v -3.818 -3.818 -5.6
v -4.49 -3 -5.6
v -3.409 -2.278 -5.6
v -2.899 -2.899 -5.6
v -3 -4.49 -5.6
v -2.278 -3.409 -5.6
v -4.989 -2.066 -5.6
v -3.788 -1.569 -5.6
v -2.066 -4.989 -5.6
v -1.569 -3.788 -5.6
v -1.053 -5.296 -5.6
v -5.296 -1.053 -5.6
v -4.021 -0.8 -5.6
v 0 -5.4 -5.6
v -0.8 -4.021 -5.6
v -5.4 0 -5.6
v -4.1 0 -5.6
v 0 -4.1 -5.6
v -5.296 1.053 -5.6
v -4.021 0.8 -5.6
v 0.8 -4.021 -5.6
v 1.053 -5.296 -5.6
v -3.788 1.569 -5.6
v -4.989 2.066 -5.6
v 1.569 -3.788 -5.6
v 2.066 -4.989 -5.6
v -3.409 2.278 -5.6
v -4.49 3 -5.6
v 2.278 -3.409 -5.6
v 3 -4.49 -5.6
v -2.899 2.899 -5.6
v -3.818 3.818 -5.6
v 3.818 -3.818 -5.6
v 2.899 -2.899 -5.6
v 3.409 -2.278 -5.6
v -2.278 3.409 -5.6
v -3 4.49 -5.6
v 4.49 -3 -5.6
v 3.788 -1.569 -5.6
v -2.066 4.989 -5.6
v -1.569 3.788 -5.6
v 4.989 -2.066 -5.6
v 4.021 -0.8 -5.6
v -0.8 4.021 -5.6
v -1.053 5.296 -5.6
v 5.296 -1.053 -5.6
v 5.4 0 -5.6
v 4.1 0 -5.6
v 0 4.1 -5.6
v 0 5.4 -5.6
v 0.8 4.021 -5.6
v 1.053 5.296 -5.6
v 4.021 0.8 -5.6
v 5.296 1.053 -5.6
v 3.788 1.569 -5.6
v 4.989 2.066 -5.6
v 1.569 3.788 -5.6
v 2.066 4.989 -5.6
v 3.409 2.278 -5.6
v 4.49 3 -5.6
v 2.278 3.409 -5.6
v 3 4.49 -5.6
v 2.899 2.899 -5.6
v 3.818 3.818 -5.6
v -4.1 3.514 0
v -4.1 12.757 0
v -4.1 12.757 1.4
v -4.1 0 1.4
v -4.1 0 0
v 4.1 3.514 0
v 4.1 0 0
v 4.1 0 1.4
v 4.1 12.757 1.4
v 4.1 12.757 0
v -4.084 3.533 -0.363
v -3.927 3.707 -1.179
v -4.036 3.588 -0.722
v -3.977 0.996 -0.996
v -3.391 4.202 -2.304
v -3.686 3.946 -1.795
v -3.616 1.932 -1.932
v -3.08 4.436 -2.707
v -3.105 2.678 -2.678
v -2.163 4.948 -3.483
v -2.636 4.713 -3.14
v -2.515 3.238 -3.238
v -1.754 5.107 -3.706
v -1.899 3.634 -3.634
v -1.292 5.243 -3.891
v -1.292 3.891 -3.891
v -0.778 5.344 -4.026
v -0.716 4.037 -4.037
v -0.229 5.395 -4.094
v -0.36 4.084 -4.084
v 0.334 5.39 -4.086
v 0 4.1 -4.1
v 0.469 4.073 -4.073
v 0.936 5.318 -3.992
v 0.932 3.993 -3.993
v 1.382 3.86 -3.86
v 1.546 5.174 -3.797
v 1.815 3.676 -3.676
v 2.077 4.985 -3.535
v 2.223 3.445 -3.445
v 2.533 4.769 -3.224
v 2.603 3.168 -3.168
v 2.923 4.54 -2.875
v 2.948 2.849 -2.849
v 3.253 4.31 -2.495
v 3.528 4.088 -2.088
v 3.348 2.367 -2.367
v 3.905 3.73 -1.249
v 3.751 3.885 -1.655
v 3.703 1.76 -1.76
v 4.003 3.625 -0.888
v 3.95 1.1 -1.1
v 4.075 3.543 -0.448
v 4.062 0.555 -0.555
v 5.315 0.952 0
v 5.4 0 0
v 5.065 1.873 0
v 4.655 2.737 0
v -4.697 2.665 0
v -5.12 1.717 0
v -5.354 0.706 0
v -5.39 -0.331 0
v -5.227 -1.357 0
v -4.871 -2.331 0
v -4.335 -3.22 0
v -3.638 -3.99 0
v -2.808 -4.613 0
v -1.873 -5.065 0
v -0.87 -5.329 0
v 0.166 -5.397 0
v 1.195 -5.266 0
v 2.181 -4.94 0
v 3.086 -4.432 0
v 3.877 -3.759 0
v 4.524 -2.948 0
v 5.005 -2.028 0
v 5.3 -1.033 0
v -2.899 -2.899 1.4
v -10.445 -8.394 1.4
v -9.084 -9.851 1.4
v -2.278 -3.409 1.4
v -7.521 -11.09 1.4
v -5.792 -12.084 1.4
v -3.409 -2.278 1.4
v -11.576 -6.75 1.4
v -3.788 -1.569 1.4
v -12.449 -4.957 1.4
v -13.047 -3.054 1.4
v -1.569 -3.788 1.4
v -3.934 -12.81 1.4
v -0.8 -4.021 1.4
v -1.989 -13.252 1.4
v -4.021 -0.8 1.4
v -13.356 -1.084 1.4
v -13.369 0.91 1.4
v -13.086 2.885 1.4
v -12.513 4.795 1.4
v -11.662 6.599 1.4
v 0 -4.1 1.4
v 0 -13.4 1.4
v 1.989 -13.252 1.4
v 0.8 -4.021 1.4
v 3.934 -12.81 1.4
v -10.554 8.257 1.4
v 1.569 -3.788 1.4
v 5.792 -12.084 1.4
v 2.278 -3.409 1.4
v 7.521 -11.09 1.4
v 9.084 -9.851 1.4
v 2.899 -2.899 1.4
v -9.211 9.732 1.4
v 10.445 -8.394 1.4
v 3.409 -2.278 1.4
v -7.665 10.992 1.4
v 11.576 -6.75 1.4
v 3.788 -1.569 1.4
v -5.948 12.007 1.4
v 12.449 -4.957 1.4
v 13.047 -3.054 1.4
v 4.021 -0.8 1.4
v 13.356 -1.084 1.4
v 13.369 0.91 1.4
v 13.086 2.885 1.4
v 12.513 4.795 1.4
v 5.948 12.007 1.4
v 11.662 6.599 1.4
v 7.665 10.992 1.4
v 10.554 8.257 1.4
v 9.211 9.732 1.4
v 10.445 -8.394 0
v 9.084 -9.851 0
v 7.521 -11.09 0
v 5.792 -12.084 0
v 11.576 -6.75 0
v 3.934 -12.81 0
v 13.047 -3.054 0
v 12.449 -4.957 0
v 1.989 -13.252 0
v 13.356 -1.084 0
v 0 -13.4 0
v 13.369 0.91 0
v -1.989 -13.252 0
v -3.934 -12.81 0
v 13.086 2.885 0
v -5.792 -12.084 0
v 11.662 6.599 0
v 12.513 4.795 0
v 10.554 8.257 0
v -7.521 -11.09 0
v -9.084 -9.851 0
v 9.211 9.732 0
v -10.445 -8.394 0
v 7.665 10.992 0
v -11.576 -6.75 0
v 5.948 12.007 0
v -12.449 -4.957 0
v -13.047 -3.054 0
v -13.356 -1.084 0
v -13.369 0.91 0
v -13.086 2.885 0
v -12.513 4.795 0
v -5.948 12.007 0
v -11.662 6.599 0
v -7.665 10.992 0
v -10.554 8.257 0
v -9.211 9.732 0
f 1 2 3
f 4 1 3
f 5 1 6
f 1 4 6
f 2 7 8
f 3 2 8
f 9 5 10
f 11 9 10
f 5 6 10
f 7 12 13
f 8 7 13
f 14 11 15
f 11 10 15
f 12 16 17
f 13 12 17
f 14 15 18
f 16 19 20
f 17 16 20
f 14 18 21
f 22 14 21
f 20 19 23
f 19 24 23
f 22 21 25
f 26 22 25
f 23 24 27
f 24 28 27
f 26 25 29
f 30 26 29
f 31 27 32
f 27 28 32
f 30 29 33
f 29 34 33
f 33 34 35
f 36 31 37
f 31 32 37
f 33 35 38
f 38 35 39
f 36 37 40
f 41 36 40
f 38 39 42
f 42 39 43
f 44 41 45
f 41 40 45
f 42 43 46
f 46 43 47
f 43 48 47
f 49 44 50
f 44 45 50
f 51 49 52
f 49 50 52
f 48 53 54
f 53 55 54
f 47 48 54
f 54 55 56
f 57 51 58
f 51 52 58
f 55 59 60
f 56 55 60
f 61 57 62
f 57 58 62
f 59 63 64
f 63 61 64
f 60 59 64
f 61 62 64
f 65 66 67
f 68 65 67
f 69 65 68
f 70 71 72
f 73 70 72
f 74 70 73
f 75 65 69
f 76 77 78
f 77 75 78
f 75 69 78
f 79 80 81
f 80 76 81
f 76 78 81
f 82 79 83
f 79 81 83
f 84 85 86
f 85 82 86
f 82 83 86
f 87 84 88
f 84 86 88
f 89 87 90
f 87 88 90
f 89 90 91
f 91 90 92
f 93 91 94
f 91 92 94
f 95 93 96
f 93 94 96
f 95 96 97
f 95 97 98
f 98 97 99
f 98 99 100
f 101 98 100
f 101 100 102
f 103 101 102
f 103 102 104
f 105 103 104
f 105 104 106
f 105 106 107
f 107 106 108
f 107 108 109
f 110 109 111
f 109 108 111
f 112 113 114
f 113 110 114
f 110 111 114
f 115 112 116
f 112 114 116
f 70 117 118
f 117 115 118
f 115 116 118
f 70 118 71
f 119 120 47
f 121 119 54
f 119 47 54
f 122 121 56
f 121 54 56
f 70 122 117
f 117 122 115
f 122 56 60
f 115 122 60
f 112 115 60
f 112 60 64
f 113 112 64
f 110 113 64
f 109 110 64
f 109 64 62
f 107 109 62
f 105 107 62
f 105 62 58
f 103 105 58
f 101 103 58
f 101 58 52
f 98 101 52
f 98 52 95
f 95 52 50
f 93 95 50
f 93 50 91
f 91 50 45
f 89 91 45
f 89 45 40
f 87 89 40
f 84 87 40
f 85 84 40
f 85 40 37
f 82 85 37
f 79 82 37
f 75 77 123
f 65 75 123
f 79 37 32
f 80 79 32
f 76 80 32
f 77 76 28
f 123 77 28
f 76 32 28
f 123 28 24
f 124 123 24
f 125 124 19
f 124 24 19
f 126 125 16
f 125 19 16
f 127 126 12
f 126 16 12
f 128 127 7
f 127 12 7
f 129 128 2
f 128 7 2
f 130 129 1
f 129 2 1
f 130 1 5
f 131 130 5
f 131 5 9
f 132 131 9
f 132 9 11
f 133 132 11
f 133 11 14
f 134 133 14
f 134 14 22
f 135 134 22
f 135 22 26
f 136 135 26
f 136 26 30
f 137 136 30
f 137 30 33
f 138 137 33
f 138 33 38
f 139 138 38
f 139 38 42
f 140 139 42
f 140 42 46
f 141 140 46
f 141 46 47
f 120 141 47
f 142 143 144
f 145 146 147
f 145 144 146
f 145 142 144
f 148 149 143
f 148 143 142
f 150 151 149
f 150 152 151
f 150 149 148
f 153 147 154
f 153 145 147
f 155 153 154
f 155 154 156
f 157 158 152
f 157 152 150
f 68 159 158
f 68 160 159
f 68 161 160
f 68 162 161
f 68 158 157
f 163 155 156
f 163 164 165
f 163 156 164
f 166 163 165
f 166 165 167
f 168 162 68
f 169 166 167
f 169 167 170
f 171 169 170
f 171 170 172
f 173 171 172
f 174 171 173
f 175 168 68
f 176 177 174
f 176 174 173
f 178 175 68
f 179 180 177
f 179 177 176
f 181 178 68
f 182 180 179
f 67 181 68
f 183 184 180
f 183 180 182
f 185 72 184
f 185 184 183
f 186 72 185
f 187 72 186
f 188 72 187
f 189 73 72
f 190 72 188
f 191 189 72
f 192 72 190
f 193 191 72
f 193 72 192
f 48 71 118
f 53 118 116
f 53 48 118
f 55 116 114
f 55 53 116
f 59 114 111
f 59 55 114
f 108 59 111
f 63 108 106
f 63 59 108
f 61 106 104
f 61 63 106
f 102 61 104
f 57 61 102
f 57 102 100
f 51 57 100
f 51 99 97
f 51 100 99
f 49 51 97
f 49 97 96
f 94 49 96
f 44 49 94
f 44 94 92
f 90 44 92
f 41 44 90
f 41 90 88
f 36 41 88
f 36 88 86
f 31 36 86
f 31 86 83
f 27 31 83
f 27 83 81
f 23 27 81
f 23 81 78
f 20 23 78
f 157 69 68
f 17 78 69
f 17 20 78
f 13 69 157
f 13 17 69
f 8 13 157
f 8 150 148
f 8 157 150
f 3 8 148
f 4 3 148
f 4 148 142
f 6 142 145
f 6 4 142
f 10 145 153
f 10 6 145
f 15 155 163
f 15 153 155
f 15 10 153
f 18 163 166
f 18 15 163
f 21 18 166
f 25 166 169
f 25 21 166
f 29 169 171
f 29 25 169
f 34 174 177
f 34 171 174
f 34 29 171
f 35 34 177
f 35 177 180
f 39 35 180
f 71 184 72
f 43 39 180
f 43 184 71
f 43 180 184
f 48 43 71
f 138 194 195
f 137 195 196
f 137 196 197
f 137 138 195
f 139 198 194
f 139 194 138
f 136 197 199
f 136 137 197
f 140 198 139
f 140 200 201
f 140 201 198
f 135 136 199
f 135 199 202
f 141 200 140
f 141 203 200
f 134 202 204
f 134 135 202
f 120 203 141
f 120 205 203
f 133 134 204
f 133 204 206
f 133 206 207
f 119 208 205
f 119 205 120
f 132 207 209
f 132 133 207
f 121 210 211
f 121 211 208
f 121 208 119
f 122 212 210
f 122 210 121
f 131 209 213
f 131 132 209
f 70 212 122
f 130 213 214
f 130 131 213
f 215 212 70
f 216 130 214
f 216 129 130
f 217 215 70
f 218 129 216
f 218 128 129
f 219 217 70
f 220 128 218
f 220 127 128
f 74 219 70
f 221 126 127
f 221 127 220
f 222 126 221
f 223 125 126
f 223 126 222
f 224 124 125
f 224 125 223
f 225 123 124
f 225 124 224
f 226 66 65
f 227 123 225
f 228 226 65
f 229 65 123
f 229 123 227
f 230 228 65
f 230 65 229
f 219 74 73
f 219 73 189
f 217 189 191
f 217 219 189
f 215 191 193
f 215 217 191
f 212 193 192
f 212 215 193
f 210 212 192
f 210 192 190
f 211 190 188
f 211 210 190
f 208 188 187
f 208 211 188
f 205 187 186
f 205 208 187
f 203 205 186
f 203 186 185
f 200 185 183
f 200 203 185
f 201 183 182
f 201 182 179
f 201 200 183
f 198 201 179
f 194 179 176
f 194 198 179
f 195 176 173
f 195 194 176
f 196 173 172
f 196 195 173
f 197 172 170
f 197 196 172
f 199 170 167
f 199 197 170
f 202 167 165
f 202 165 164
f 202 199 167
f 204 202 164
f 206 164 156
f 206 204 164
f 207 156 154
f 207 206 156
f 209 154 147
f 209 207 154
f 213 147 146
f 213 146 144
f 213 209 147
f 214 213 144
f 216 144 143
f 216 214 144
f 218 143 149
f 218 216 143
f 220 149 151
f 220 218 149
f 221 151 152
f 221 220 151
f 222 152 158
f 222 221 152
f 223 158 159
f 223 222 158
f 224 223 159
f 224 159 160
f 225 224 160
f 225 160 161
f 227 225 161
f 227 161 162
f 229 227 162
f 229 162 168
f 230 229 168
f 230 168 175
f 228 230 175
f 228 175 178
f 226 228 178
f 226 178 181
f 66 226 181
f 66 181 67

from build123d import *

# Parameters (mm, degrees)
BOSS_EXTRU_1_DEPTH      = 1.4
BOSS_EXTRU_2_START      = -7
ESQUISSE2_R             = 5.4
ESQUISSE2_R_2           = 4.1
BOSS_EXTRU_2_DEPTH      = 7
ENL_V_MAT_EXTRU_1_DEPTH = 7


with BuildPart() as part:
    # Esquisse1 → Boss.-Extru.1 (new body)
    with BuildSketch(Plane.XY):
        with BuildLine():
            Line((4.1, 0), (4.1, 12.757350822))
            ThreePointArc((4.1, 12.757350822), (0, -13.4), (-4.1, 12.757350822))
            Line((-4.1, 12.757350822), (-4.1, 0))
            ThreePointArc((-4.1, 0), (0, -4.1), (4.1, 0))
        make_face()
    extrude(amount=BOSS_EXTRU_1_DEPTH)

    # Esquisse2 → Boss.-Extru.2 (add)
    with BuildSketch(Plane.XY.offset(1.4).offset(BOSS_EXTRU_2_START)):
        Circle(ESQUISSE2_R)
        Circle(ESQUISSE2_R_2, mode=Mode.SUBTRACT)
    extrude(amount=BOSS_EXTRU_2_DEPTH)

    # Esquisse3 → Enlèv. mat.-Extru.1 (cut)
    with BuildSketch(Plane(origin=(0, 0, 0), x_dir=(1, 0, 0), z_dir=(0, 1, 0))):
        with BuildLine():
            Line((-4.1, -1.4), (-4.1, 0))
            ThreePointArc((-4.1, 0), (0, 4.1), (4.1, 0))
            Line((4.1, 0), (4.1, -1.4))
            Line((4.1, -1.4), (-4.1, -1.4))
        make_face()
    extrude(amount=ENL_V_MAT_EXTRU_1_DEPTH, mode=Mode.SUBTRACT)


solid = part.part
